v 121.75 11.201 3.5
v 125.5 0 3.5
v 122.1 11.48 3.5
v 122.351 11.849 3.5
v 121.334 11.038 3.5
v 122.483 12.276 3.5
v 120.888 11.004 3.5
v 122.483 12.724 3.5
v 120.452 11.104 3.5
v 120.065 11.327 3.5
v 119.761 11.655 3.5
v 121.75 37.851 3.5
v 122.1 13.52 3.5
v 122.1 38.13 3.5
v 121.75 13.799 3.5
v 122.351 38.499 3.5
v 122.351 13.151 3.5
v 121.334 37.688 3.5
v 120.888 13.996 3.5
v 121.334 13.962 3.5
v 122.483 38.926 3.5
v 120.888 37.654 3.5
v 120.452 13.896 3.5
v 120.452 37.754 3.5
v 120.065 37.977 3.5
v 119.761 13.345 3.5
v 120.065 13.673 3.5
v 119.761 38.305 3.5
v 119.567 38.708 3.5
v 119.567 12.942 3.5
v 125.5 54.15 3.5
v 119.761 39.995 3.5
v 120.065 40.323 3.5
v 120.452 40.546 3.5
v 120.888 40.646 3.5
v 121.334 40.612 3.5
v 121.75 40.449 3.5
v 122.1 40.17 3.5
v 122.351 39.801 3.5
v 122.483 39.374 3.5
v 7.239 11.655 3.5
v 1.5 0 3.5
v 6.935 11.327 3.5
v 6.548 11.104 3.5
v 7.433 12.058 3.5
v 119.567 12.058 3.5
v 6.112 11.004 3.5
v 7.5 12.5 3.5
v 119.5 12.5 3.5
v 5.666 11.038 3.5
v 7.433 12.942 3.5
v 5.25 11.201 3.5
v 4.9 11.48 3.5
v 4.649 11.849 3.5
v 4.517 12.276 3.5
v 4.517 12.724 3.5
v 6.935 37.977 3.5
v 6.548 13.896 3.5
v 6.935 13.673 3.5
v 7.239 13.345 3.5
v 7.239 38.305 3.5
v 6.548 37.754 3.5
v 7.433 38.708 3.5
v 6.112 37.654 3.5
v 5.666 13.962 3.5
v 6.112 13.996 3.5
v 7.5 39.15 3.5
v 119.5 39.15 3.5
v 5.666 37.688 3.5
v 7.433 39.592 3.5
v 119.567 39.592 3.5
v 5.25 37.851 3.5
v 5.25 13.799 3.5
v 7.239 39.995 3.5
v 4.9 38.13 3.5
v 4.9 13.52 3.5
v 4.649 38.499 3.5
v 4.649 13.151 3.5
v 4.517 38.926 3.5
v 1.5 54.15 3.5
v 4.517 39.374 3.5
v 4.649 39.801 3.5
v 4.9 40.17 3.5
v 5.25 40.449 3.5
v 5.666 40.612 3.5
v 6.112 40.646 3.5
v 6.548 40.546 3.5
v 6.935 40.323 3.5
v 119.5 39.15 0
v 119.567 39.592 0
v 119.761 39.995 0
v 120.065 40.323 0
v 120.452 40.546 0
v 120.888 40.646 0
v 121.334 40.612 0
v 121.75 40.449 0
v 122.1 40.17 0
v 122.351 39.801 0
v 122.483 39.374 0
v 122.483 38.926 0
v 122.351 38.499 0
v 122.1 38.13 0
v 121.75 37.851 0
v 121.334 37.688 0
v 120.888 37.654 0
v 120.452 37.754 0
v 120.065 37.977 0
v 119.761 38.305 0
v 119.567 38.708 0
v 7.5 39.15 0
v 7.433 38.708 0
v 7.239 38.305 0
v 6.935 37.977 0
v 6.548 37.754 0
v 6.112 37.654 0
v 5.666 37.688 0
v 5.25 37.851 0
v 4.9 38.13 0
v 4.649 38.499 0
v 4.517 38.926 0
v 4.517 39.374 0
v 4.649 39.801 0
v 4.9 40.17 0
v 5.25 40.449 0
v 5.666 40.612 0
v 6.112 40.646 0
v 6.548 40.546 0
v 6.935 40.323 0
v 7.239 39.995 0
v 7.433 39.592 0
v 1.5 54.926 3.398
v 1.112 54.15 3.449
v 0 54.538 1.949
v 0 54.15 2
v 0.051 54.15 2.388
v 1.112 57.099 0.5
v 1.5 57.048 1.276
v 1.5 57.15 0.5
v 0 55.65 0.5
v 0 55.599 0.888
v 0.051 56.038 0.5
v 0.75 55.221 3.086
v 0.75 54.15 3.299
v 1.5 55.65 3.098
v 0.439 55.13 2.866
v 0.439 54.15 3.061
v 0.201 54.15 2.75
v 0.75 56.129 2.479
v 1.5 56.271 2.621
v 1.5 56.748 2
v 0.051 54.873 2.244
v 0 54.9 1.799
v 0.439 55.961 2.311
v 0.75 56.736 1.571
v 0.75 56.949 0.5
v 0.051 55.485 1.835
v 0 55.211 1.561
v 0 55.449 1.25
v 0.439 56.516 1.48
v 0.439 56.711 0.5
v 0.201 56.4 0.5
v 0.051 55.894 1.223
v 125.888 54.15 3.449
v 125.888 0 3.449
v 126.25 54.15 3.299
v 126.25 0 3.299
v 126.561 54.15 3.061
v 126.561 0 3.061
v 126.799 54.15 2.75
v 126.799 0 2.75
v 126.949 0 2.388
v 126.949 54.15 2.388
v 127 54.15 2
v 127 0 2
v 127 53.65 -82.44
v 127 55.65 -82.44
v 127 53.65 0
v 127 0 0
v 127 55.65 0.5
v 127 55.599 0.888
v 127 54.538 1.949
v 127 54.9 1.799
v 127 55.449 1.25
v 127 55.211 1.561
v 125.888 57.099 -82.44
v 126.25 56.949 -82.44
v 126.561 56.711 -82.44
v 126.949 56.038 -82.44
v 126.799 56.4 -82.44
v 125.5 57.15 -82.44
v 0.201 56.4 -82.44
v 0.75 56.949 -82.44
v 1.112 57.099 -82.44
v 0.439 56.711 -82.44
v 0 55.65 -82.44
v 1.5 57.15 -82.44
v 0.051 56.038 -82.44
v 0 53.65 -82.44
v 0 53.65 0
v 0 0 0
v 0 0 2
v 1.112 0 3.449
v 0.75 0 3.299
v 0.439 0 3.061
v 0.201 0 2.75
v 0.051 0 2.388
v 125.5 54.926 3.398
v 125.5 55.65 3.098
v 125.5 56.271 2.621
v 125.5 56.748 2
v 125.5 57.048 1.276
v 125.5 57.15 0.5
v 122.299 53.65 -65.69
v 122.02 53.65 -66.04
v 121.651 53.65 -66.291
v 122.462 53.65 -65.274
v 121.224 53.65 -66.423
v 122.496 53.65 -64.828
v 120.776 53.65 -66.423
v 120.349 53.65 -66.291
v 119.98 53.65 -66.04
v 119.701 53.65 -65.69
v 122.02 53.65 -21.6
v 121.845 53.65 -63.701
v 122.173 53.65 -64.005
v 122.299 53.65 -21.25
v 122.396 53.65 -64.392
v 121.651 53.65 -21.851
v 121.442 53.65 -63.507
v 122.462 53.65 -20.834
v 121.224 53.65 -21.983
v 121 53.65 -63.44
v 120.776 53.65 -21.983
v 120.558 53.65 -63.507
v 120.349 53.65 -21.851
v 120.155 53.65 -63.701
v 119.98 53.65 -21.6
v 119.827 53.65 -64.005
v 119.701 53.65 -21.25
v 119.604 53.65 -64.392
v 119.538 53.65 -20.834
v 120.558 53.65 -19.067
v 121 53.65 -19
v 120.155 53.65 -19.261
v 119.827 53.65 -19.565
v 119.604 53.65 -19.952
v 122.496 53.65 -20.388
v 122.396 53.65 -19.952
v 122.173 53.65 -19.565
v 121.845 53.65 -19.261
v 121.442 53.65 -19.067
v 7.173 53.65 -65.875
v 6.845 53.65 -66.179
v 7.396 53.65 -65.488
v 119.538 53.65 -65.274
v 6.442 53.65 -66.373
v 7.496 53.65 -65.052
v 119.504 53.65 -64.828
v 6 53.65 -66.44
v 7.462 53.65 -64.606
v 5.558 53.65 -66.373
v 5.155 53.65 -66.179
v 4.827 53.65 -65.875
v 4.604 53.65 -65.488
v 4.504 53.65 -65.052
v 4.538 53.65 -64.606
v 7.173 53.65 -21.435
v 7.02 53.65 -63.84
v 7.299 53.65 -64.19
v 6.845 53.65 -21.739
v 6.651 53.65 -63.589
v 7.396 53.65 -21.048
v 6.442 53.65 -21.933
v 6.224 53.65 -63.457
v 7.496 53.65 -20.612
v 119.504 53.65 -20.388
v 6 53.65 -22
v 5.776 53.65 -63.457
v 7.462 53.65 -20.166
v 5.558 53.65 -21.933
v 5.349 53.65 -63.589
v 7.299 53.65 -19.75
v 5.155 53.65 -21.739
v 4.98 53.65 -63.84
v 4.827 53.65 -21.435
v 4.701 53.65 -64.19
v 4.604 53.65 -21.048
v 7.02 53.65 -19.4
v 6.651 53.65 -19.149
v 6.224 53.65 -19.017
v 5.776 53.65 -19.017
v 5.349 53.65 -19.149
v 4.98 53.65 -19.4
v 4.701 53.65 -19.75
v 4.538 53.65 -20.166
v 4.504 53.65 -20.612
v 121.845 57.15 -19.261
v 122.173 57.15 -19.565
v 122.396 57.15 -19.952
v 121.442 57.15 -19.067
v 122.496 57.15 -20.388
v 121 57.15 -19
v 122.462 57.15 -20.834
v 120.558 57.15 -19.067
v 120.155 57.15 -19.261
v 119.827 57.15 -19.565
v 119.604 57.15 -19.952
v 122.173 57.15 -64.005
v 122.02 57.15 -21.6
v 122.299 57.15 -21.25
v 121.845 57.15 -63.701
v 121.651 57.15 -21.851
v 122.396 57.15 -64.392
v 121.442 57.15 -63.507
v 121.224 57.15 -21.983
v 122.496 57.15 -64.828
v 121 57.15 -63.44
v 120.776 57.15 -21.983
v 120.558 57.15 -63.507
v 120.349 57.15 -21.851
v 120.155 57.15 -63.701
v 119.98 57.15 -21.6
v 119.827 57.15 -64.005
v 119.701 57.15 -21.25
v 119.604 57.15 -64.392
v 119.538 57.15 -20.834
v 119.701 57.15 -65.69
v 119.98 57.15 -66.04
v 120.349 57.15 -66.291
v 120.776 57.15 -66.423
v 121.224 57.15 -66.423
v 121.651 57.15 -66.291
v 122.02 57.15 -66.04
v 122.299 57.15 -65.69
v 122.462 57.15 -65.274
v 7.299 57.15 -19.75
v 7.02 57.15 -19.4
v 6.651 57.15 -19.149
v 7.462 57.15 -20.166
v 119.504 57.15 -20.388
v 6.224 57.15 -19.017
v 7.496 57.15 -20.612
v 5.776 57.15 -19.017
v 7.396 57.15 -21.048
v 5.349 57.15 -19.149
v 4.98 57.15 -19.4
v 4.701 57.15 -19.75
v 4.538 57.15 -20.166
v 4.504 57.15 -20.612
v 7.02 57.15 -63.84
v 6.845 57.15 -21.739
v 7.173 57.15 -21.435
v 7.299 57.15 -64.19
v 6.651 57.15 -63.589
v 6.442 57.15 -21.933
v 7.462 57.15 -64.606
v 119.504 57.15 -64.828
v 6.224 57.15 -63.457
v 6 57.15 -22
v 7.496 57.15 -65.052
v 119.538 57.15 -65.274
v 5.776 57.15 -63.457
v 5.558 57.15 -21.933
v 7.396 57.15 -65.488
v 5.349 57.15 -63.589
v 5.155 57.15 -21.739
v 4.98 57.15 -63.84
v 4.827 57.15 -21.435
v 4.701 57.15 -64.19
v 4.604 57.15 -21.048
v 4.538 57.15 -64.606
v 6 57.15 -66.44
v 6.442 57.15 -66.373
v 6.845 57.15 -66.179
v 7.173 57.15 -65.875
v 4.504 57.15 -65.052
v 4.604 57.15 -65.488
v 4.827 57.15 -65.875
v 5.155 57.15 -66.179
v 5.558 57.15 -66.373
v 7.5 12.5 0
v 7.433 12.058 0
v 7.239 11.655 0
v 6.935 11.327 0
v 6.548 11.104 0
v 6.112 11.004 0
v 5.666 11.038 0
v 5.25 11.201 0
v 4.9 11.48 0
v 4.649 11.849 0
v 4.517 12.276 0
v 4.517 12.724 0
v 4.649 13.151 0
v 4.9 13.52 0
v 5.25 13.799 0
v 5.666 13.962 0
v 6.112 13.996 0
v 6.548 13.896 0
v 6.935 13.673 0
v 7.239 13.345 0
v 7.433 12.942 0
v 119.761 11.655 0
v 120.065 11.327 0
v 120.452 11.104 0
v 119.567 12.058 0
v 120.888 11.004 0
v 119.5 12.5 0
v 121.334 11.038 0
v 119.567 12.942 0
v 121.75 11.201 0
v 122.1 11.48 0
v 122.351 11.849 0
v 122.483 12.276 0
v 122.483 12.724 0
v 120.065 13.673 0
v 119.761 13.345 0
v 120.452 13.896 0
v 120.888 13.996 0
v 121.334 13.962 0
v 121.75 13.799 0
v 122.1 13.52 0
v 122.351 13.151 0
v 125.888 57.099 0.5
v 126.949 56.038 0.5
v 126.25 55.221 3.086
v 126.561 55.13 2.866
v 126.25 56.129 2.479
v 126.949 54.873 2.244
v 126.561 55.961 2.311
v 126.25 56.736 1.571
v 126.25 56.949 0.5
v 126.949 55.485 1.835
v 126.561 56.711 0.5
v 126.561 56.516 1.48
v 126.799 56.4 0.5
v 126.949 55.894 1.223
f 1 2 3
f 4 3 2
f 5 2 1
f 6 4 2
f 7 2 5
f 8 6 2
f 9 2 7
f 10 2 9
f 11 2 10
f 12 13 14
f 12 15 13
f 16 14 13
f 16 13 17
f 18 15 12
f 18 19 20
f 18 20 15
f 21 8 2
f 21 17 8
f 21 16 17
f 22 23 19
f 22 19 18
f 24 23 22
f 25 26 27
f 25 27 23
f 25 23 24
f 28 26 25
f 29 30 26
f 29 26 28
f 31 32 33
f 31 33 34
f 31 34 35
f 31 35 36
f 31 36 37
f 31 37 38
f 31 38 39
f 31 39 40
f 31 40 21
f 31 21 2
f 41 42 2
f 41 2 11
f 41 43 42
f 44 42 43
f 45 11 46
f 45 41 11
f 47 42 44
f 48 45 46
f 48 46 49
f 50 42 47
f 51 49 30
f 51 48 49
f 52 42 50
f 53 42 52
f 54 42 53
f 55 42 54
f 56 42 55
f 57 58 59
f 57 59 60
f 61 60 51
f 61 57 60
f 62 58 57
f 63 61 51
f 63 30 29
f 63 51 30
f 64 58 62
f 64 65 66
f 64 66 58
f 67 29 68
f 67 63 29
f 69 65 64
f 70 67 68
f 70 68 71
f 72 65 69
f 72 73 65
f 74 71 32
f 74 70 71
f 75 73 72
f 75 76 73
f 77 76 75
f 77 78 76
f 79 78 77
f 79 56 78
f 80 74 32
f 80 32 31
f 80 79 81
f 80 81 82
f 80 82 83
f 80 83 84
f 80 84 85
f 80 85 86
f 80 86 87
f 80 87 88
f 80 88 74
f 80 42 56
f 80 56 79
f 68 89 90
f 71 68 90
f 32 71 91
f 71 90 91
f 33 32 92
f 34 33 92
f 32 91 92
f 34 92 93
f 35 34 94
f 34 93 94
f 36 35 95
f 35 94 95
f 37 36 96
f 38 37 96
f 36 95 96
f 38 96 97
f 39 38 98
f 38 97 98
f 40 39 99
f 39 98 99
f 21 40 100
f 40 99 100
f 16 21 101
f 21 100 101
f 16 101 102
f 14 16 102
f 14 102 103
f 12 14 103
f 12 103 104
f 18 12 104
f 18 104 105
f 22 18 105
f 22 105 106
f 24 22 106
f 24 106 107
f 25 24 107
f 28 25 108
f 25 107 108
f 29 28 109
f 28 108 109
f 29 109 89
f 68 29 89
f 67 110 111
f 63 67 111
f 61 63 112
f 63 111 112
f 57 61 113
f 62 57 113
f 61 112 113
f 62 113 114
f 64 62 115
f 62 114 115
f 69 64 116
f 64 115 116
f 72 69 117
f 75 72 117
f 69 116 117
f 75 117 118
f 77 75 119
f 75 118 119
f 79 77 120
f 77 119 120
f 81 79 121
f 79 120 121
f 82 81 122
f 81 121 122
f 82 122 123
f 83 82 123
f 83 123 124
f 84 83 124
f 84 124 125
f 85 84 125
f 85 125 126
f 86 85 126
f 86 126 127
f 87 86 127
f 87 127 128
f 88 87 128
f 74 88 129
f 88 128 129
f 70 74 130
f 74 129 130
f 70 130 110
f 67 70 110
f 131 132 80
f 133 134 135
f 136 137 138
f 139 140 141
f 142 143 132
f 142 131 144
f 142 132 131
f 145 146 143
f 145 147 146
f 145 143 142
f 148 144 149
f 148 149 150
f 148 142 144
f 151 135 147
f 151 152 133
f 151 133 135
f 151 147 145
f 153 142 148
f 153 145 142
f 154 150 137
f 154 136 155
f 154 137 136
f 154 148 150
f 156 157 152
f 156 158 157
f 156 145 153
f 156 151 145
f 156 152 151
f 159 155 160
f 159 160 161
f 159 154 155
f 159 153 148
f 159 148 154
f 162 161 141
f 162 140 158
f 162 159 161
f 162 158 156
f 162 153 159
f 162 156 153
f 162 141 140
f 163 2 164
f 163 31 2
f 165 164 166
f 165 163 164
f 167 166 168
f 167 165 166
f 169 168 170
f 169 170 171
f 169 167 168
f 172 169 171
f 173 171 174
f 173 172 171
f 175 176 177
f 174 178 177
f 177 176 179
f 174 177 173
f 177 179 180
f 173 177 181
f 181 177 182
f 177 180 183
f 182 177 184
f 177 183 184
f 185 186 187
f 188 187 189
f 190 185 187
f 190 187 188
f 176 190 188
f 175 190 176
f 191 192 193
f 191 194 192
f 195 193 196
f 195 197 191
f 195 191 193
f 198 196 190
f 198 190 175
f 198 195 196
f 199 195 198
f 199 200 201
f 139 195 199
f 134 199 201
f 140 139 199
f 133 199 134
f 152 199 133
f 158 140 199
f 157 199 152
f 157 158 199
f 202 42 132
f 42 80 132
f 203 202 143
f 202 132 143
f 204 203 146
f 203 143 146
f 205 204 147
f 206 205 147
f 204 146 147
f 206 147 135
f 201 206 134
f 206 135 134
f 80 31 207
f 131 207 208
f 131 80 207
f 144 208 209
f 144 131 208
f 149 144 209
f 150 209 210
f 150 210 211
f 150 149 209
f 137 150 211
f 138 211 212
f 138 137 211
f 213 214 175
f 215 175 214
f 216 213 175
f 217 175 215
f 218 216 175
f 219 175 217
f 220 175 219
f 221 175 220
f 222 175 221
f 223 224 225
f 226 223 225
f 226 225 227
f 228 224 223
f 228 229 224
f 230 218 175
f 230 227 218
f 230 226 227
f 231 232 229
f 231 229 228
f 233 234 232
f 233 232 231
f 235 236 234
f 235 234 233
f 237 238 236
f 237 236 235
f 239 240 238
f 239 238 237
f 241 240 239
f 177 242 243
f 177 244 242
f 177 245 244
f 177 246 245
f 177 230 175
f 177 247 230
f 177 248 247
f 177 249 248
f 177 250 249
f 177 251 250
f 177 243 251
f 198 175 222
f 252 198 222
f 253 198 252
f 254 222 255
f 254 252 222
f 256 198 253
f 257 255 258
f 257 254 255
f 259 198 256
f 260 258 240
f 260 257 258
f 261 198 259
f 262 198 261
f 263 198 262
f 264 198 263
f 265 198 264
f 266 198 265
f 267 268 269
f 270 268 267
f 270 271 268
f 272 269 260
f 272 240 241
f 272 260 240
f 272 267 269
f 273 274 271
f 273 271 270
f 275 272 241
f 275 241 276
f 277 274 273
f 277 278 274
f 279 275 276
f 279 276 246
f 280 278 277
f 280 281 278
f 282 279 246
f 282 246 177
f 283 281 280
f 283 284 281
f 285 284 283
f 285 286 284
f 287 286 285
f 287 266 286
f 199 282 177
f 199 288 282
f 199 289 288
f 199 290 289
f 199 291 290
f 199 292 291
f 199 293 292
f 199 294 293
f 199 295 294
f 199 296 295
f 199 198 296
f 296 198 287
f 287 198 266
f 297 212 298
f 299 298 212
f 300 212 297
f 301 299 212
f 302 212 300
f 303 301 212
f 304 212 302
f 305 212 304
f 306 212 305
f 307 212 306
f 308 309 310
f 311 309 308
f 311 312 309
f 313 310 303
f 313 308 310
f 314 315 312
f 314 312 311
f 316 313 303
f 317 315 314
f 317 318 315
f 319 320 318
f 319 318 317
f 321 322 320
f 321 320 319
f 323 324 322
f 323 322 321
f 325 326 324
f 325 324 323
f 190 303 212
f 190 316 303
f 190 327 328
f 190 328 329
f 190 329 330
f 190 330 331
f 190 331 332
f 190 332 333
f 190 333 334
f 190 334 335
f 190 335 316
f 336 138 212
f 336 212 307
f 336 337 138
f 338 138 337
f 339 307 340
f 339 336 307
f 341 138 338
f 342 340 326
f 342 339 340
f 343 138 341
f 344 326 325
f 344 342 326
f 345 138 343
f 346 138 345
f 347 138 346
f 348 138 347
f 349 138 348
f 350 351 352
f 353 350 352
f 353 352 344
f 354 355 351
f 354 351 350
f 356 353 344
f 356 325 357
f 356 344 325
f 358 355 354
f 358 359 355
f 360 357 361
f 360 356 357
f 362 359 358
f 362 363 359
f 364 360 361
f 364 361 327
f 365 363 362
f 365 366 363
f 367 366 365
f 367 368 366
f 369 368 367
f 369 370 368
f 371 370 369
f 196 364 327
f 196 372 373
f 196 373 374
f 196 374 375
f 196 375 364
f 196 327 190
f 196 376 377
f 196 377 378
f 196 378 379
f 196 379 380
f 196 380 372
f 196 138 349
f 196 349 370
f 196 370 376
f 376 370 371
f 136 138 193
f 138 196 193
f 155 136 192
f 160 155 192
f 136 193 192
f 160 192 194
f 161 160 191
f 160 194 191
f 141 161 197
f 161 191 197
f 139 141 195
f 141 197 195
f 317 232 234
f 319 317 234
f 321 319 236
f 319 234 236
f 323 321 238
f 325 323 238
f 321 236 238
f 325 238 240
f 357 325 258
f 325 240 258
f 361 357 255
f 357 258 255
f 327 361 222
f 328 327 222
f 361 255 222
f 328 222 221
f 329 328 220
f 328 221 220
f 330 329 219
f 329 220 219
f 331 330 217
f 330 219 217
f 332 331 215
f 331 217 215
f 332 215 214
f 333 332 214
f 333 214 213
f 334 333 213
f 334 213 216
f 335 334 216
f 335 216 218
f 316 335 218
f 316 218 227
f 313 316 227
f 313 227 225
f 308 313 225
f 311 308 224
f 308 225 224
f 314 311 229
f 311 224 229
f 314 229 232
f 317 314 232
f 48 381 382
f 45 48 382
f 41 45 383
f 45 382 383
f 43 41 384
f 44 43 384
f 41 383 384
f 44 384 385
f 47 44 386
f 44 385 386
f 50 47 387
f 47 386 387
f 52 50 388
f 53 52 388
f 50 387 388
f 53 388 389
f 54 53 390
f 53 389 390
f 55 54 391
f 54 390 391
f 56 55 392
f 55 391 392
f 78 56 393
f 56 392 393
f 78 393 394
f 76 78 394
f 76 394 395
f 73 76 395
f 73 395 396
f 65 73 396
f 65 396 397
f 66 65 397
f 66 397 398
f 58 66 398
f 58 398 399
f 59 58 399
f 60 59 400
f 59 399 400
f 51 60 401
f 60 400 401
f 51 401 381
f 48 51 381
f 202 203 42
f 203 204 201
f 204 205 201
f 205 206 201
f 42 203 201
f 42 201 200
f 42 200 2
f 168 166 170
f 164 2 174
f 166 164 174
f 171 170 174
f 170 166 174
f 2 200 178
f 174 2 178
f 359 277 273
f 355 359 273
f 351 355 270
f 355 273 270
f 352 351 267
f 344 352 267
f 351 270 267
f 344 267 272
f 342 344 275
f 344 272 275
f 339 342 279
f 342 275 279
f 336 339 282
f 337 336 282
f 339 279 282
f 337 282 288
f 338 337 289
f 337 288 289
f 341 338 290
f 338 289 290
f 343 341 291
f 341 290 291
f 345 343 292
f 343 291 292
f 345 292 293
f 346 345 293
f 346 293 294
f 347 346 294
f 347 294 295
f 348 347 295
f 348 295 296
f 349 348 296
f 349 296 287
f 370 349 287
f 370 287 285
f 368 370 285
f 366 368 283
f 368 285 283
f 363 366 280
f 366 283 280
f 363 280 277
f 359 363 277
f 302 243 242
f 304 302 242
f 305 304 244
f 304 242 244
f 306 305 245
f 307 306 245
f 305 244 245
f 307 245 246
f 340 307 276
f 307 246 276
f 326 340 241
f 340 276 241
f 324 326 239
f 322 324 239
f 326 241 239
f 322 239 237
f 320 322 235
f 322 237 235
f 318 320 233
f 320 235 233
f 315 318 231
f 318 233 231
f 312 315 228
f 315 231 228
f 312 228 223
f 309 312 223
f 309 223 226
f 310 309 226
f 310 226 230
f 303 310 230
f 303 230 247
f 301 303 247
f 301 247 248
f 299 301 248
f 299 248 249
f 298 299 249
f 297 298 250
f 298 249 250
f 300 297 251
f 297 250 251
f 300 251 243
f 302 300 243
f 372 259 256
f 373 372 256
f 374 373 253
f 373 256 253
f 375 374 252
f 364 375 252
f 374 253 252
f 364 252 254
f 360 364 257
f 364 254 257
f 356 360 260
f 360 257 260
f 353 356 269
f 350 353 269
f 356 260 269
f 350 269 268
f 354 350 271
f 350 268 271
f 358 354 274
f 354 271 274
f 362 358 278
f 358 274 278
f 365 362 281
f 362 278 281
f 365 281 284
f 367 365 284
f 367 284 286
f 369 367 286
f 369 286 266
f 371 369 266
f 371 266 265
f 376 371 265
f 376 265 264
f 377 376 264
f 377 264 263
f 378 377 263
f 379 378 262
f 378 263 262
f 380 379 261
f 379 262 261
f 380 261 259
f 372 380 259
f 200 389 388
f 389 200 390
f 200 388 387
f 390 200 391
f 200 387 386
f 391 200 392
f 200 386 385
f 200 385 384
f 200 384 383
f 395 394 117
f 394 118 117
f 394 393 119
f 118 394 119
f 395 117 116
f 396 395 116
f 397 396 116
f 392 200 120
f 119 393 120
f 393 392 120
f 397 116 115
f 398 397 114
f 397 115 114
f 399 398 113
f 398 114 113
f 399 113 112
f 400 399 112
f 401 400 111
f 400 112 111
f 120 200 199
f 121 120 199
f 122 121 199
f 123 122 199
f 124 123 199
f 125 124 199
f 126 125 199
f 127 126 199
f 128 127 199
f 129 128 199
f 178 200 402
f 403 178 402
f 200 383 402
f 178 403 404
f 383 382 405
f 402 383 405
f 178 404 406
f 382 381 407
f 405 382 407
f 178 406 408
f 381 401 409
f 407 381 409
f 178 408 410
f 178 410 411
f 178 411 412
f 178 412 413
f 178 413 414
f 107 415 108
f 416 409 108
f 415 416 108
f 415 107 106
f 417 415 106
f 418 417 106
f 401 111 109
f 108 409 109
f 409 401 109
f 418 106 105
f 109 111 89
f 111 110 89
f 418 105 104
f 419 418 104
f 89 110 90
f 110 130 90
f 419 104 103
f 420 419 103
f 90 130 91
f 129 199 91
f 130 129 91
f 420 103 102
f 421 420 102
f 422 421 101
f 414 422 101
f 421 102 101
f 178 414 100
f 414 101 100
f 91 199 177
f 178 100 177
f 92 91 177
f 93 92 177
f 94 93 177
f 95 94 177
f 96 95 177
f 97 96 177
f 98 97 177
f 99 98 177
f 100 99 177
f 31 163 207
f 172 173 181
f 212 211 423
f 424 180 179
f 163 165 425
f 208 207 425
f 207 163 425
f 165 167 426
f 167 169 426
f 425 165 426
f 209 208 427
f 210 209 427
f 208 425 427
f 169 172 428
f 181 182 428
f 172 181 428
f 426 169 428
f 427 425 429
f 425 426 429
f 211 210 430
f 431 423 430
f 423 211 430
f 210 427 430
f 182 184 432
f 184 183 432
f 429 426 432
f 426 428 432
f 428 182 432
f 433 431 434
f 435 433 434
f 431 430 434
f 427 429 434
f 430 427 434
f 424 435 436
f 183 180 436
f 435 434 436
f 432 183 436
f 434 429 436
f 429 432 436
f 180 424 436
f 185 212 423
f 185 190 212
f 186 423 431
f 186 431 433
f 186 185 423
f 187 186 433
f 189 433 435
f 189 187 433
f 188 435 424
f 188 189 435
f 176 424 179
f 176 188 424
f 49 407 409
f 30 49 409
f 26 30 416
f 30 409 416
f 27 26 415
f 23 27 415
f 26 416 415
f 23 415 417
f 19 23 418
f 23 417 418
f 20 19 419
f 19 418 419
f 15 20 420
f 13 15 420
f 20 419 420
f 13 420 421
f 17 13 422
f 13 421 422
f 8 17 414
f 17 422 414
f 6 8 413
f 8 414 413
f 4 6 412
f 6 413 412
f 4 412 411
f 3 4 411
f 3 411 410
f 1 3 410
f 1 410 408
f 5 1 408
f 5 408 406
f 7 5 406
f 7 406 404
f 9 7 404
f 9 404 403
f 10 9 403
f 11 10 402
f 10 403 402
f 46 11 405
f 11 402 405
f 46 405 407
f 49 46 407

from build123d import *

# Parameters (mm, degrees)
SKETCH1_W           = 127
SKETCH1_H           = 53.65
BOSS_EXTRUDE1_DEPTH = 3.5
BOSS_EXTRUDE3_DEPTH = 127
SKETCH4_R           = 1.5
CUT_EXTRUDE1_DEPTH  = 3.5
SKETCH6_R           = 1.5
CUT_EXTRUDE3_DEPTH  = 3.5
FILLET1_R           = 1.5
FILLET2_R           = 1.5


with BuildPart() as part:
    # Sketch1 → Boss-Extrude1 (new body)
    with BuildSketch(Plane.XY):
        with Locations((63.5, 26.825)):
            Rectangle(SKETCH1_W, SKETCH1_H)
    extrude(amount=BOSS_EXTRUDE1_DEPTH)

    # Sketch2 → Boss-Extrude3 (add)
    with BuildSketch(Plane.ZY):
        with BuildLine():
            Line((3.5, 53.65), (3.5, 54.15))
            ThreePointArc((3.5, 54.15), (2.621320344, 56.271320344), (0.5, 57.15))
            Line((0.5, 57.15), (-82.44, 57.15))
            Line((-82.44, 57.15), (-82.44, 53.65))
            Line((-82.44, 53.65), (0, 53.65))
            Line((0, 53.65), (3.5, 53.65))
        make_face()
    extrude(amount=-BOSS_EXTRUDE3_DEPTH)

    # Sketch4 → Cut-Extrude1 (cut)
    with BuildSketch(Plane(origin=(0, 0, 0), x_dir=(-1, 0, 0), z_dir=(0, 0, -1))):
        with Locations((-121, 39.15)):
            Circle(SKETCH4_R)
        with Locations((-121, 12.5)):
            Circle(SKETCH4_R)
        with Locations(Location((-6, 12.5, 0), (0, 0, 180))):
            Circle(SKETCH4_R)
        with Locations(Location((-6, 39.15, 0), (0, 0, 180))):
            Circle(SKETCH4_R)
    extrude(amount=-CUT_EXTRUDE1_DEPTH, mode=Mode.SUBTRACT)

    # Sketch6 → Cut-Extrude3 (cut)
    with BuildSketch(Plane.XZ.offset(-53.65)):
        with Locations(Location((6, -20.5, 0), (0, 0, 270))):
            Circle(SKETCH6_R)
        with Locations(Location((6, -64.94, 0), (0, 0, 270))):
            Circle(SKETCH6_R)
        with Locations(Location((121, -64.94, 0), (0, 0, 90))):
            Circle(SKETCH6_R)
        with Locations(Location((121, -20.5, 0), (0, 0, 90))):
            Circle(SKETCH6_R)
    extrude(amount=-CUT_EXTRUDE3_DEPTH, mode=Mode.SUBTRACT)

    # Fillet1
    fillet1_edges = [part.edges().sort_by_distance(p)[0] for p in [
        (127, 27.075, 3.5),
        (127, 57.15, -40.97),
        (127, 56.271320344, 2.621320344),
    ]]
    fillet(fillet1_edges, radius=FILLET1_R)

    # Fillet2
    fillet2_edges = [part.edges().sort_by_distance(p)[0] for p in [
        (0, 56.271320344, 2.621320344),
        (0, 57.15, -40.97),
        (0, 27.075, 3.5),
    ]]
    fillet(fillet2_edges, radius=FILLET2_R)


solid = part.part
